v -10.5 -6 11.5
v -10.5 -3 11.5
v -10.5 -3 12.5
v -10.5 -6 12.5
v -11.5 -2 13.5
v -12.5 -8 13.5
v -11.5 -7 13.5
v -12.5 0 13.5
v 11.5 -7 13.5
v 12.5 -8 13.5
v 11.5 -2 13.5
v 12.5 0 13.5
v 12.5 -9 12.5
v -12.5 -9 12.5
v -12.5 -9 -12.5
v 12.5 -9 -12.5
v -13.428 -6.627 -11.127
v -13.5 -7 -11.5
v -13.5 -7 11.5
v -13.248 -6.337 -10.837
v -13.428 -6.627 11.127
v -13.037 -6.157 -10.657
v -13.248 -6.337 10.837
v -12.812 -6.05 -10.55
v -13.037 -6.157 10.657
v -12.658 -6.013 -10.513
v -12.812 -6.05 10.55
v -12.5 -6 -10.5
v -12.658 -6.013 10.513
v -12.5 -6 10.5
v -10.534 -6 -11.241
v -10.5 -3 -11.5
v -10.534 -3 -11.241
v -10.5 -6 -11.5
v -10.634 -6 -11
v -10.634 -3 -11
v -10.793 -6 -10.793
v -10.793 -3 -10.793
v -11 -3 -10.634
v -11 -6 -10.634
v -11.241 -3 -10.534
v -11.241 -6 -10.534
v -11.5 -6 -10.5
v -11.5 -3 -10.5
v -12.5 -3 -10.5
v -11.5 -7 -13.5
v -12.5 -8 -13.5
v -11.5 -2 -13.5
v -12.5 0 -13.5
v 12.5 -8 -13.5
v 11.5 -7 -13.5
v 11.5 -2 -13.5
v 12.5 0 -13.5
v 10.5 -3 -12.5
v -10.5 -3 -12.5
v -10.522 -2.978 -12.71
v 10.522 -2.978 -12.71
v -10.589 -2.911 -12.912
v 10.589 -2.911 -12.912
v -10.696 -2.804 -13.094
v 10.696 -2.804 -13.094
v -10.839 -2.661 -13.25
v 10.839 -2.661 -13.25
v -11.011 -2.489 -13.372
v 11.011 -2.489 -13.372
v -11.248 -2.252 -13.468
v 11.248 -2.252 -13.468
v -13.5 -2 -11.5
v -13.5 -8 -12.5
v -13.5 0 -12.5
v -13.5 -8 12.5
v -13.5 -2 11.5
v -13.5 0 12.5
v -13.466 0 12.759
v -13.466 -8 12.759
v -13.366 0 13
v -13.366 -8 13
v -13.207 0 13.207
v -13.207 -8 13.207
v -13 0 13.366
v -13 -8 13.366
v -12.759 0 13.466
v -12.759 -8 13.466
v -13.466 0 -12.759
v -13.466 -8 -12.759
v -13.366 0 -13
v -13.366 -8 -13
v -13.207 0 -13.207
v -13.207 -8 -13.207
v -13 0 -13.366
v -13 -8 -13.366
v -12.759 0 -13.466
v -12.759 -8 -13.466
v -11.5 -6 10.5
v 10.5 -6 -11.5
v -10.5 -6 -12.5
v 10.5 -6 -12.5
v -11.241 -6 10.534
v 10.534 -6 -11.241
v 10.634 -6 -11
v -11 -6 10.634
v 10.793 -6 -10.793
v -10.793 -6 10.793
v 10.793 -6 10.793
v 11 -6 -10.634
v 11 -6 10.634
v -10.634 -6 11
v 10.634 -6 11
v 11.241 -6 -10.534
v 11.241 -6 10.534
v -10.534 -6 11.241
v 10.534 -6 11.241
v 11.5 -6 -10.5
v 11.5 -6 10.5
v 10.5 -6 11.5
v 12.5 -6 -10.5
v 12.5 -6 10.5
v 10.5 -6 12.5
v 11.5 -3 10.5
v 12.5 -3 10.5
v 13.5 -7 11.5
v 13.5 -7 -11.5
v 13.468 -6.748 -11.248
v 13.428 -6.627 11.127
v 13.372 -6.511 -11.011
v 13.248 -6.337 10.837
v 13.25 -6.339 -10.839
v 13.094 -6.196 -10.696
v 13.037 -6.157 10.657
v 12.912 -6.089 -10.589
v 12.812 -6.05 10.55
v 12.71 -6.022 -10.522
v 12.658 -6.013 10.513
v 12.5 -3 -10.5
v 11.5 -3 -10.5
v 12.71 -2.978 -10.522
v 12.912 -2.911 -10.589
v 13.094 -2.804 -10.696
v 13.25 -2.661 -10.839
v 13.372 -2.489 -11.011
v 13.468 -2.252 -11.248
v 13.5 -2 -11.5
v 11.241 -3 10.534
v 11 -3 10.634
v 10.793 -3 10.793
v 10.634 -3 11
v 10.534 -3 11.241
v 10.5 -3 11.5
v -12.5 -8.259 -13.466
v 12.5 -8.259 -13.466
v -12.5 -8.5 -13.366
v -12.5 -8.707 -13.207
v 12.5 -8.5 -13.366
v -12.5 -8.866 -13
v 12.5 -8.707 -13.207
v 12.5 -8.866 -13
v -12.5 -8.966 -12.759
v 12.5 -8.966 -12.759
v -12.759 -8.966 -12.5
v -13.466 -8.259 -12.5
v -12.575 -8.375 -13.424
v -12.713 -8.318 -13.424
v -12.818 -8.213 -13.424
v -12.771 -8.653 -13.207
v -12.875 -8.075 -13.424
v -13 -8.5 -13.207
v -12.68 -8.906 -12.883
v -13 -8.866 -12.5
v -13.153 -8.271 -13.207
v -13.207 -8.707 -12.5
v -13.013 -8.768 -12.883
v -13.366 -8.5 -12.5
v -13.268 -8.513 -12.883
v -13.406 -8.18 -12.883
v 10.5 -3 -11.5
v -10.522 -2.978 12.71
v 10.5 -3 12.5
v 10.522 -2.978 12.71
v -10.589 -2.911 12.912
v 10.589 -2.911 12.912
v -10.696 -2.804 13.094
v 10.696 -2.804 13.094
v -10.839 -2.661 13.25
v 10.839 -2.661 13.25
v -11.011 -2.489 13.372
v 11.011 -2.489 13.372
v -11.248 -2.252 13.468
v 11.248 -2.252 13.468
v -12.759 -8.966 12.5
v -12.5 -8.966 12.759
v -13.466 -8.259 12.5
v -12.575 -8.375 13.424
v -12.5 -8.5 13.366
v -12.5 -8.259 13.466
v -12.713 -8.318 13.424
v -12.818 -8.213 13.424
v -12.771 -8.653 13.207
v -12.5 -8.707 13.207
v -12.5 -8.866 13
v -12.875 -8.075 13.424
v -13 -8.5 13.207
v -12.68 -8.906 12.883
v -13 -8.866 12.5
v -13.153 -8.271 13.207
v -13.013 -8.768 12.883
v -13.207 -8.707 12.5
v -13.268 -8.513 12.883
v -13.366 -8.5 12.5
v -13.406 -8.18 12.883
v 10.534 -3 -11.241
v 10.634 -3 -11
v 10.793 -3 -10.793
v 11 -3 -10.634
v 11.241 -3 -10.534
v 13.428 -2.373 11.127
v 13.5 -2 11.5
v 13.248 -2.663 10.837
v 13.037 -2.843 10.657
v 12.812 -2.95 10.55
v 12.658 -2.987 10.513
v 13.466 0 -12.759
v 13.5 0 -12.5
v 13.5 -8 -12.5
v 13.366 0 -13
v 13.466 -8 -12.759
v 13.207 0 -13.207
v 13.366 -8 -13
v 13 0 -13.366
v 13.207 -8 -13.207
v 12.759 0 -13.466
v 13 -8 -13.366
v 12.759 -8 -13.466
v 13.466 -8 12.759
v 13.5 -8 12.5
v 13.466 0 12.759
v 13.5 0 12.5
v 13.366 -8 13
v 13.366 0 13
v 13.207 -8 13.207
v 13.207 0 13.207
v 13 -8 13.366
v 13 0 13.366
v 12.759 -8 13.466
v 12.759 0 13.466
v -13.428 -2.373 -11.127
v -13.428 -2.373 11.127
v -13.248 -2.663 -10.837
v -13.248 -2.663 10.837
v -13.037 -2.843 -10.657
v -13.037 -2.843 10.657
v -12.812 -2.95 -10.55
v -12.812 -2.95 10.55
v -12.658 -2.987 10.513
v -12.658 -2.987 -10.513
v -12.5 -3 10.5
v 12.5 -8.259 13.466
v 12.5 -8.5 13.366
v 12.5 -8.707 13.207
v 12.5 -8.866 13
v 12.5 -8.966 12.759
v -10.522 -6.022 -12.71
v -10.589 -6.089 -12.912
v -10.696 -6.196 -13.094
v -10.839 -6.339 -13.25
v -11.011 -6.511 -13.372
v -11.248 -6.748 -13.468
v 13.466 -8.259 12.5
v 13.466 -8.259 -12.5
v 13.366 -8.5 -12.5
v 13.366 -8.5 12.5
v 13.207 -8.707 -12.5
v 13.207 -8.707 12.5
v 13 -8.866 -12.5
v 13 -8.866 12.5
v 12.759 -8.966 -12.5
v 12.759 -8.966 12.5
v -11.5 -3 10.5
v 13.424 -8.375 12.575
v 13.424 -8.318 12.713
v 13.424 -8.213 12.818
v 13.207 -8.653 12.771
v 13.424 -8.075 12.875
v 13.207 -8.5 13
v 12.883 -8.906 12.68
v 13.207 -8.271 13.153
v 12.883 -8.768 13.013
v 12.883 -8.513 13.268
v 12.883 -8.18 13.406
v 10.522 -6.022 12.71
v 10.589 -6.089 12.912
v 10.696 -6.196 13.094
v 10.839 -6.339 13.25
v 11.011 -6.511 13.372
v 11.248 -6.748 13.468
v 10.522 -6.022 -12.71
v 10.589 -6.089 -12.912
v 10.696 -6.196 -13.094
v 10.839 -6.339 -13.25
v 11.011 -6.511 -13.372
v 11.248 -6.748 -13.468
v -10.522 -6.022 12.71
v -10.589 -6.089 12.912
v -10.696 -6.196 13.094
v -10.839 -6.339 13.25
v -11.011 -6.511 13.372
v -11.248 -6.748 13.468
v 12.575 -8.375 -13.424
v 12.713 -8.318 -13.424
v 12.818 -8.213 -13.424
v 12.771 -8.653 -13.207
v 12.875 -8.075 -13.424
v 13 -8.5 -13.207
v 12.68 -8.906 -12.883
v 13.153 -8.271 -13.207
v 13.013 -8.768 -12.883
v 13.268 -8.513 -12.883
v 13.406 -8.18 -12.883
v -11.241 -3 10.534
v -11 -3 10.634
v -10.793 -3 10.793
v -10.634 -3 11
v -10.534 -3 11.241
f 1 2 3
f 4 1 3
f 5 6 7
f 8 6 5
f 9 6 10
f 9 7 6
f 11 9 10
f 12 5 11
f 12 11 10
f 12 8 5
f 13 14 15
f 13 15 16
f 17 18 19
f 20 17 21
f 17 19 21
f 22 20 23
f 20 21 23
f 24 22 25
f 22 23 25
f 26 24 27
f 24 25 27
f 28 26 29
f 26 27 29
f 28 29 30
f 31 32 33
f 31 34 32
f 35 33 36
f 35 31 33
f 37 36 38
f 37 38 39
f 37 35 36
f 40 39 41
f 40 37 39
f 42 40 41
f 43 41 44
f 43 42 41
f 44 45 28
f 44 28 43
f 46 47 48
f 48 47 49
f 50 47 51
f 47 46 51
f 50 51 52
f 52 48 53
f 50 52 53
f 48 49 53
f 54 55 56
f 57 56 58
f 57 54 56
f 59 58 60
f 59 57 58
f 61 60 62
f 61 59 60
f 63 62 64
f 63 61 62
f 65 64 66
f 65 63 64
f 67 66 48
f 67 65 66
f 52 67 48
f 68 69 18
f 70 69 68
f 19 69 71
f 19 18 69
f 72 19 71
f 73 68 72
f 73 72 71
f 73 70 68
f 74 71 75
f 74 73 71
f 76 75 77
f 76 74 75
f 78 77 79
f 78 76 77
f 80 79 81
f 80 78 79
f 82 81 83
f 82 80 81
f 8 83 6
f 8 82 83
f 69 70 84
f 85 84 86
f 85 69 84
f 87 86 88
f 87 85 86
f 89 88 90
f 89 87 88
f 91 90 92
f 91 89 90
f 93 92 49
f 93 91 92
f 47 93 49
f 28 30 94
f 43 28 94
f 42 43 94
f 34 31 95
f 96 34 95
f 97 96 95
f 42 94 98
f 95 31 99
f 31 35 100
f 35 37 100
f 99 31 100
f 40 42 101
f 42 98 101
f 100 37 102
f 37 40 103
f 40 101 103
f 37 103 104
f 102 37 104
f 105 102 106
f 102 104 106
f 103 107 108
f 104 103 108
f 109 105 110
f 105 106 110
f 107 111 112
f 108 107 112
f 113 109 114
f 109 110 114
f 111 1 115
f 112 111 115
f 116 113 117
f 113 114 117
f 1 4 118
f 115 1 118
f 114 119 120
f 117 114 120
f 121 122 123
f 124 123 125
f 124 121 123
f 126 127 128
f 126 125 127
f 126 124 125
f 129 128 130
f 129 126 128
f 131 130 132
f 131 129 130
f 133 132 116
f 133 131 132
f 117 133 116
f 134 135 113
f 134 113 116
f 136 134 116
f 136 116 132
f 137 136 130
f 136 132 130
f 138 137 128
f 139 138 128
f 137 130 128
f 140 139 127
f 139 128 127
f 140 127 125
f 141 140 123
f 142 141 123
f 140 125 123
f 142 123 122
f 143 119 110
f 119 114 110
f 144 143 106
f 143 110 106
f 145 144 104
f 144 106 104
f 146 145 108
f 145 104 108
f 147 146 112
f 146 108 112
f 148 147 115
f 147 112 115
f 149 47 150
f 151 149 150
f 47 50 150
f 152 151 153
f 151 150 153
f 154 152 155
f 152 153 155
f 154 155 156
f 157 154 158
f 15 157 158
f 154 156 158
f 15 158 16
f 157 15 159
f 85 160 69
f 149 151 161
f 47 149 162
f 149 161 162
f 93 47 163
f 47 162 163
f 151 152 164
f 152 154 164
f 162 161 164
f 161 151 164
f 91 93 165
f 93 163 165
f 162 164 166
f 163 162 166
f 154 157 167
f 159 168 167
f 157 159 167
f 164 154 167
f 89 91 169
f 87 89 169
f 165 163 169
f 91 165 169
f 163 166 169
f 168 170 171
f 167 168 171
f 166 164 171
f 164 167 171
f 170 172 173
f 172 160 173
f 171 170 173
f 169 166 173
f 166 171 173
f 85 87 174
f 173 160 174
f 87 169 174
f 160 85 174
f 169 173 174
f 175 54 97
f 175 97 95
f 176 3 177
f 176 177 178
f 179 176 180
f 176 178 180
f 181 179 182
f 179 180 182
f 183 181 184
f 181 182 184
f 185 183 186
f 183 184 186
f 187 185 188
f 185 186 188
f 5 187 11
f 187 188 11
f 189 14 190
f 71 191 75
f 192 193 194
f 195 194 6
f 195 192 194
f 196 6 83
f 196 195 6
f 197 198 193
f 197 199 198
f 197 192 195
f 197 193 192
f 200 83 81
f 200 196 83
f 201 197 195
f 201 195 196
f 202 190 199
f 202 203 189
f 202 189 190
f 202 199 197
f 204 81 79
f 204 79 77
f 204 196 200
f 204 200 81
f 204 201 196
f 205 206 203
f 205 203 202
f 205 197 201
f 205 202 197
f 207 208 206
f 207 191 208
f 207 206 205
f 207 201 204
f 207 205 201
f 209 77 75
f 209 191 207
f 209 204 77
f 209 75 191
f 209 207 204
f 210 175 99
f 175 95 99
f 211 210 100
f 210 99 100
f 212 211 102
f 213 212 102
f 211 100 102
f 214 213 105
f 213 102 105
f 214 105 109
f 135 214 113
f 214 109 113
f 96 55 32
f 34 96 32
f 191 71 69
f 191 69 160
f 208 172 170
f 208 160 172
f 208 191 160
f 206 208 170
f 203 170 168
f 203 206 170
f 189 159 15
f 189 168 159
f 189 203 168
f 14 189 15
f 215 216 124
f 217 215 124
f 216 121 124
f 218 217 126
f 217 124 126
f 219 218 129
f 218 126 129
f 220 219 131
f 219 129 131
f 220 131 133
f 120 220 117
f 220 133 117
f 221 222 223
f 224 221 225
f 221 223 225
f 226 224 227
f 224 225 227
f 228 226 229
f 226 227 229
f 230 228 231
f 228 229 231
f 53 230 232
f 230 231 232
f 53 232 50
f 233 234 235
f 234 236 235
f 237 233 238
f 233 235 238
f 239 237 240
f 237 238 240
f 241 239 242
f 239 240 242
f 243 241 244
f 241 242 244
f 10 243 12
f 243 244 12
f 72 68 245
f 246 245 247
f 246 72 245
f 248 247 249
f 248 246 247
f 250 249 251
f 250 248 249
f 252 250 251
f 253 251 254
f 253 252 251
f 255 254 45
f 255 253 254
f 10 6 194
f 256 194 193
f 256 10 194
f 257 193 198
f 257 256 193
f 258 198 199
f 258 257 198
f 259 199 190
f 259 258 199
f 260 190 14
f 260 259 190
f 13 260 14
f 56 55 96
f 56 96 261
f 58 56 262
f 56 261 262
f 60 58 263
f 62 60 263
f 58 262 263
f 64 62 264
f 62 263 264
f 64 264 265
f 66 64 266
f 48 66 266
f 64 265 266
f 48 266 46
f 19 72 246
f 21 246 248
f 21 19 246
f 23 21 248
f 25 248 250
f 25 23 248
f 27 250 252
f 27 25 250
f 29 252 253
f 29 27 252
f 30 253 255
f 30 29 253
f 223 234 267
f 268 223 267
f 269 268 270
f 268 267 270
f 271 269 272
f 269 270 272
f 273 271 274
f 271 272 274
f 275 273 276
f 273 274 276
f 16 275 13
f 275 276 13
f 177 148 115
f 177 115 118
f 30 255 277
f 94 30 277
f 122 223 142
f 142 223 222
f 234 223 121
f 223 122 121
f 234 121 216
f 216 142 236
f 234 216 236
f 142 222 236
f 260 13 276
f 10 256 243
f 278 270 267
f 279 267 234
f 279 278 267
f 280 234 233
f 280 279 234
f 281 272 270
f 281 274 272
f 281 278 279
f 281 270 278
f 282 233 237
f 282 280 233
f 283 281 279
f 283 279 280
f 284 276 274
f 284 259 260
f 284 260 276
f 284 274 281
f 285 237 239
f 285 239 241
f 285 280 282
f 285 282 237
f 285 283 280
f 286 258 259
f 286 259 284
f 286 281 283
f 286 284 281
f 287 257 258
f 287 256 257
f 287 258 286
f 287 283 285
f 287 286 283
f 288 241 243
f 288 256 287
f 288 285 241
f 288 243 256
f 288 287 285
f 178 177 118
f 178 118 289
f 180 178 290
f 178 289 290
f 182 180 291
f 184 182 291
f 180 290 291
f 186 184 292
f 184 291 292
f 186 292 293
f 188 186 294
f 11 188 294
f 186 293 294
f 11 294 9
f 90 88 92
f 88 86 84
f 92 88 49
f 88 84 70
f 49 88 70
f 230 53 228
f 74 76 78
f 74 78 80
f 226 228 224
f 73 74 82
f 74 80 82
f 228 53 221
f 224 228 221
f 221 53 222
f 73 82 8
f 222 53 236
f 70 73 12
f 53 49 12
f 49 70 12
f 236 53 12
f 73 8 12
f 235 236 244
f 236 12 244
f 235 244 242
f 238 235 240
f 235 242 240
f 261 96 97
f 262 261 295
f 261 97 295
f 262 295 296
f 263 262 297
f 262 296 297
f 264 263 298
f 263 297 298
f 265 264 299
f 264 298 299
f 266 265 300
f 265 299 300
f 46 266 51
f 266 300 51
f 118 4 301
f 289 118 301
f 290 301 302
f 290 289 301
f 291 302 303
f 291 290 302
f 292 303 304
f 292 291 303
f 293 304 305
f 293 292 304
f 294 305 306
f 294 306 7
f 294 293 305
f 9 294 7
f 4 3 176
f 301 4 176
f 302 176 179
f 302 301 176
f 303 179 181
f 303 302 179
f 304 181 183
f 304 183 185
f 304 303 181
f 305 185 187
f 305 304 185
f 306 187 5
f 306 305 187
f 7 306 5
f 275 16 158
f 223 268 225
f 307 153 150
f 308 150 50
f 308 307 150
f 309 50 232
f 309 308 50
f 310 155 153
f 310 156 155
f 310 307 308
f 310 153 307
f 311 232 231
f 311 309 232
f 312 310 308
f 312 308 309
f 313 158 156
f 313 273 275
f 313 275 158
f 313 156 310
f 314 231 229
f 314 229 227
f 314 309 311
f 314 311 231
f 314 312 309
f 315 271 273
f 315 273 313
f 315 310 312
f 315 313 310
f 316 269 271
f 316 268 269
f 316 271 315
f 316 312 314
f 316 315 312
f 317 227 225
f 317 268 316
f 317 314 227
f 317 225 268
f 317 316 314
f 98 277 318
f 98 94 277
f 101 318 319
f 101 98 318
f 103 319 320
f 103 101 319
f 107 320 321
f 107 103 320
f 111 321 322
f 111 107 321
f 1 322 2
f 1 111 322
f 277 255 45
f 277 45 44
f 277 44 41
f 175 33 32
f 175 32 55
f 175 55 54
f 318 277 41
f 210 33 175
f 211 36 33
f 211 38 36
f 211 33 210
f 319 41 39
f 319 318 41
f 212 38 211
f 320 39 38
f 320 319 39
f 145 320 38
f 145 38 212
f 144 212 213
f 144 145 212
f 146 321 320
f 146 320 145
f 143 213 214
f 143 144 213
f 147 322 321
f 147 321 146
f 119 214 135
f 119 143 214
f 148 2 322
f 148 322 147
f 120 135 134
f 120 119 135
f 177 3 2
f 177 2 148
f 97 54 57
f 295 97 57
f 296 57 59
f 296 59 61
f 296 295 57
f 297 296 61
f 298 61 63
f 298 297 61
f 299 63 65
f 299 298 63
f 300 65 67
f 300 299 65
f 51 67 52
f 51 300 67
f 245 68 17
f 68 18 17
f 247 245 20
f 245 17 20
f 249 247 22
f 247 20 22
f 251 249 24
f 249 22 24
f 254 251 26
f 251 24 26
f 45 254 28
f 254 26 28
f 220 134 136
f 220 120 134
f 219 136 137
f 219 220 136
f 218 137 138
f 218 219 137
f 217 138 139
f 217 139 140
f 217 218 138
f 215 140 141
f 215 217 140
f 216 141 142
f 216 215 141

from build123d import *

# Parameters (mm, degrees)
F0_W     = 27
F0_H     = 27
F1_DEPTH = 3
F2_W     = 3
F2_H     = 3
F3_DEPTH = 3
F4_W     = 27
F4_H     = 27
F5_DEPTH = 3
F6_R     = 1


with BuildPart() as f1:
    # F0 (on Front) → F1 (new body)
    with BuildSketch(Plane.XZ):
        Rectangle(F0_W, F0_H)
    extrude(amount=F1_DEPTH)

    # F2 (on face) → F3 (join)
    with BuildSketch(Plane.XZ.offset(3)):
        with Locations((-12, 12)):
            Rectangle(F2_W, F2_H)
        with Locations((12, 12)):
            Rectangle(F2_W, F2_H)
        with Locations((12, -12)):
            Rectangle(F2_W, F2_H)
        with Locations((-12, -12)):
            Rectangle(F2_W, F2_H)
    extrude(amount=F3_DEPTH)

    # F4 (on face) → F5 (join)
    with BuildSketch(Plane.XZ.offset(6)):
        Rectangle(F4_W, F4_H)
    extrude(amount=F5_DEPTH)

    # F6
    f6_edges = [f1.edges().sort_by_distance(p)[0] for p in [
        (-13.5, -9, 0),
        (0, -9, 13.5),
        (13.5, -9, 0),
        (0, -9, -13.5),
        (-13.5, -3, 0),
        (-13.5, -6, 0),
        (-13.5, -4.5, 10.5),
        (-13.5, -4.5, -10.5),
        (0, -6, -13.5),
        (-10.5, -4.5, -13.5),
        (0, -3, -13.5),
        (10.5, -4.5, -13.5),
        (13.5, -4.5, -10.5),
        (13.5, -6, 0),
        (13.5, -4.5, 10.5),
        (13.5, -3, 0),
        (10.5, -4.5, 13.5),
        (0, -6, 13.5),
        (-10.5, -4.5, 13.5),
        (0, -3, 13.5),
        (10.5, -4.5, 10.5),
        (10.5, -4.5, -10.5),
        (-10.5, -4.5, -10.5),
        (-10.5, -4.5, 10.5),
        (-13.5, -4.5, 13.5),
        (13.5, -4.5, 13.5),
        (13.5, -4.5, -13.5),
        (-13.5, -4.5, -13.5),
    ]]
    fillet(f6_edges, radius=F6_R)


solid = f1.part
